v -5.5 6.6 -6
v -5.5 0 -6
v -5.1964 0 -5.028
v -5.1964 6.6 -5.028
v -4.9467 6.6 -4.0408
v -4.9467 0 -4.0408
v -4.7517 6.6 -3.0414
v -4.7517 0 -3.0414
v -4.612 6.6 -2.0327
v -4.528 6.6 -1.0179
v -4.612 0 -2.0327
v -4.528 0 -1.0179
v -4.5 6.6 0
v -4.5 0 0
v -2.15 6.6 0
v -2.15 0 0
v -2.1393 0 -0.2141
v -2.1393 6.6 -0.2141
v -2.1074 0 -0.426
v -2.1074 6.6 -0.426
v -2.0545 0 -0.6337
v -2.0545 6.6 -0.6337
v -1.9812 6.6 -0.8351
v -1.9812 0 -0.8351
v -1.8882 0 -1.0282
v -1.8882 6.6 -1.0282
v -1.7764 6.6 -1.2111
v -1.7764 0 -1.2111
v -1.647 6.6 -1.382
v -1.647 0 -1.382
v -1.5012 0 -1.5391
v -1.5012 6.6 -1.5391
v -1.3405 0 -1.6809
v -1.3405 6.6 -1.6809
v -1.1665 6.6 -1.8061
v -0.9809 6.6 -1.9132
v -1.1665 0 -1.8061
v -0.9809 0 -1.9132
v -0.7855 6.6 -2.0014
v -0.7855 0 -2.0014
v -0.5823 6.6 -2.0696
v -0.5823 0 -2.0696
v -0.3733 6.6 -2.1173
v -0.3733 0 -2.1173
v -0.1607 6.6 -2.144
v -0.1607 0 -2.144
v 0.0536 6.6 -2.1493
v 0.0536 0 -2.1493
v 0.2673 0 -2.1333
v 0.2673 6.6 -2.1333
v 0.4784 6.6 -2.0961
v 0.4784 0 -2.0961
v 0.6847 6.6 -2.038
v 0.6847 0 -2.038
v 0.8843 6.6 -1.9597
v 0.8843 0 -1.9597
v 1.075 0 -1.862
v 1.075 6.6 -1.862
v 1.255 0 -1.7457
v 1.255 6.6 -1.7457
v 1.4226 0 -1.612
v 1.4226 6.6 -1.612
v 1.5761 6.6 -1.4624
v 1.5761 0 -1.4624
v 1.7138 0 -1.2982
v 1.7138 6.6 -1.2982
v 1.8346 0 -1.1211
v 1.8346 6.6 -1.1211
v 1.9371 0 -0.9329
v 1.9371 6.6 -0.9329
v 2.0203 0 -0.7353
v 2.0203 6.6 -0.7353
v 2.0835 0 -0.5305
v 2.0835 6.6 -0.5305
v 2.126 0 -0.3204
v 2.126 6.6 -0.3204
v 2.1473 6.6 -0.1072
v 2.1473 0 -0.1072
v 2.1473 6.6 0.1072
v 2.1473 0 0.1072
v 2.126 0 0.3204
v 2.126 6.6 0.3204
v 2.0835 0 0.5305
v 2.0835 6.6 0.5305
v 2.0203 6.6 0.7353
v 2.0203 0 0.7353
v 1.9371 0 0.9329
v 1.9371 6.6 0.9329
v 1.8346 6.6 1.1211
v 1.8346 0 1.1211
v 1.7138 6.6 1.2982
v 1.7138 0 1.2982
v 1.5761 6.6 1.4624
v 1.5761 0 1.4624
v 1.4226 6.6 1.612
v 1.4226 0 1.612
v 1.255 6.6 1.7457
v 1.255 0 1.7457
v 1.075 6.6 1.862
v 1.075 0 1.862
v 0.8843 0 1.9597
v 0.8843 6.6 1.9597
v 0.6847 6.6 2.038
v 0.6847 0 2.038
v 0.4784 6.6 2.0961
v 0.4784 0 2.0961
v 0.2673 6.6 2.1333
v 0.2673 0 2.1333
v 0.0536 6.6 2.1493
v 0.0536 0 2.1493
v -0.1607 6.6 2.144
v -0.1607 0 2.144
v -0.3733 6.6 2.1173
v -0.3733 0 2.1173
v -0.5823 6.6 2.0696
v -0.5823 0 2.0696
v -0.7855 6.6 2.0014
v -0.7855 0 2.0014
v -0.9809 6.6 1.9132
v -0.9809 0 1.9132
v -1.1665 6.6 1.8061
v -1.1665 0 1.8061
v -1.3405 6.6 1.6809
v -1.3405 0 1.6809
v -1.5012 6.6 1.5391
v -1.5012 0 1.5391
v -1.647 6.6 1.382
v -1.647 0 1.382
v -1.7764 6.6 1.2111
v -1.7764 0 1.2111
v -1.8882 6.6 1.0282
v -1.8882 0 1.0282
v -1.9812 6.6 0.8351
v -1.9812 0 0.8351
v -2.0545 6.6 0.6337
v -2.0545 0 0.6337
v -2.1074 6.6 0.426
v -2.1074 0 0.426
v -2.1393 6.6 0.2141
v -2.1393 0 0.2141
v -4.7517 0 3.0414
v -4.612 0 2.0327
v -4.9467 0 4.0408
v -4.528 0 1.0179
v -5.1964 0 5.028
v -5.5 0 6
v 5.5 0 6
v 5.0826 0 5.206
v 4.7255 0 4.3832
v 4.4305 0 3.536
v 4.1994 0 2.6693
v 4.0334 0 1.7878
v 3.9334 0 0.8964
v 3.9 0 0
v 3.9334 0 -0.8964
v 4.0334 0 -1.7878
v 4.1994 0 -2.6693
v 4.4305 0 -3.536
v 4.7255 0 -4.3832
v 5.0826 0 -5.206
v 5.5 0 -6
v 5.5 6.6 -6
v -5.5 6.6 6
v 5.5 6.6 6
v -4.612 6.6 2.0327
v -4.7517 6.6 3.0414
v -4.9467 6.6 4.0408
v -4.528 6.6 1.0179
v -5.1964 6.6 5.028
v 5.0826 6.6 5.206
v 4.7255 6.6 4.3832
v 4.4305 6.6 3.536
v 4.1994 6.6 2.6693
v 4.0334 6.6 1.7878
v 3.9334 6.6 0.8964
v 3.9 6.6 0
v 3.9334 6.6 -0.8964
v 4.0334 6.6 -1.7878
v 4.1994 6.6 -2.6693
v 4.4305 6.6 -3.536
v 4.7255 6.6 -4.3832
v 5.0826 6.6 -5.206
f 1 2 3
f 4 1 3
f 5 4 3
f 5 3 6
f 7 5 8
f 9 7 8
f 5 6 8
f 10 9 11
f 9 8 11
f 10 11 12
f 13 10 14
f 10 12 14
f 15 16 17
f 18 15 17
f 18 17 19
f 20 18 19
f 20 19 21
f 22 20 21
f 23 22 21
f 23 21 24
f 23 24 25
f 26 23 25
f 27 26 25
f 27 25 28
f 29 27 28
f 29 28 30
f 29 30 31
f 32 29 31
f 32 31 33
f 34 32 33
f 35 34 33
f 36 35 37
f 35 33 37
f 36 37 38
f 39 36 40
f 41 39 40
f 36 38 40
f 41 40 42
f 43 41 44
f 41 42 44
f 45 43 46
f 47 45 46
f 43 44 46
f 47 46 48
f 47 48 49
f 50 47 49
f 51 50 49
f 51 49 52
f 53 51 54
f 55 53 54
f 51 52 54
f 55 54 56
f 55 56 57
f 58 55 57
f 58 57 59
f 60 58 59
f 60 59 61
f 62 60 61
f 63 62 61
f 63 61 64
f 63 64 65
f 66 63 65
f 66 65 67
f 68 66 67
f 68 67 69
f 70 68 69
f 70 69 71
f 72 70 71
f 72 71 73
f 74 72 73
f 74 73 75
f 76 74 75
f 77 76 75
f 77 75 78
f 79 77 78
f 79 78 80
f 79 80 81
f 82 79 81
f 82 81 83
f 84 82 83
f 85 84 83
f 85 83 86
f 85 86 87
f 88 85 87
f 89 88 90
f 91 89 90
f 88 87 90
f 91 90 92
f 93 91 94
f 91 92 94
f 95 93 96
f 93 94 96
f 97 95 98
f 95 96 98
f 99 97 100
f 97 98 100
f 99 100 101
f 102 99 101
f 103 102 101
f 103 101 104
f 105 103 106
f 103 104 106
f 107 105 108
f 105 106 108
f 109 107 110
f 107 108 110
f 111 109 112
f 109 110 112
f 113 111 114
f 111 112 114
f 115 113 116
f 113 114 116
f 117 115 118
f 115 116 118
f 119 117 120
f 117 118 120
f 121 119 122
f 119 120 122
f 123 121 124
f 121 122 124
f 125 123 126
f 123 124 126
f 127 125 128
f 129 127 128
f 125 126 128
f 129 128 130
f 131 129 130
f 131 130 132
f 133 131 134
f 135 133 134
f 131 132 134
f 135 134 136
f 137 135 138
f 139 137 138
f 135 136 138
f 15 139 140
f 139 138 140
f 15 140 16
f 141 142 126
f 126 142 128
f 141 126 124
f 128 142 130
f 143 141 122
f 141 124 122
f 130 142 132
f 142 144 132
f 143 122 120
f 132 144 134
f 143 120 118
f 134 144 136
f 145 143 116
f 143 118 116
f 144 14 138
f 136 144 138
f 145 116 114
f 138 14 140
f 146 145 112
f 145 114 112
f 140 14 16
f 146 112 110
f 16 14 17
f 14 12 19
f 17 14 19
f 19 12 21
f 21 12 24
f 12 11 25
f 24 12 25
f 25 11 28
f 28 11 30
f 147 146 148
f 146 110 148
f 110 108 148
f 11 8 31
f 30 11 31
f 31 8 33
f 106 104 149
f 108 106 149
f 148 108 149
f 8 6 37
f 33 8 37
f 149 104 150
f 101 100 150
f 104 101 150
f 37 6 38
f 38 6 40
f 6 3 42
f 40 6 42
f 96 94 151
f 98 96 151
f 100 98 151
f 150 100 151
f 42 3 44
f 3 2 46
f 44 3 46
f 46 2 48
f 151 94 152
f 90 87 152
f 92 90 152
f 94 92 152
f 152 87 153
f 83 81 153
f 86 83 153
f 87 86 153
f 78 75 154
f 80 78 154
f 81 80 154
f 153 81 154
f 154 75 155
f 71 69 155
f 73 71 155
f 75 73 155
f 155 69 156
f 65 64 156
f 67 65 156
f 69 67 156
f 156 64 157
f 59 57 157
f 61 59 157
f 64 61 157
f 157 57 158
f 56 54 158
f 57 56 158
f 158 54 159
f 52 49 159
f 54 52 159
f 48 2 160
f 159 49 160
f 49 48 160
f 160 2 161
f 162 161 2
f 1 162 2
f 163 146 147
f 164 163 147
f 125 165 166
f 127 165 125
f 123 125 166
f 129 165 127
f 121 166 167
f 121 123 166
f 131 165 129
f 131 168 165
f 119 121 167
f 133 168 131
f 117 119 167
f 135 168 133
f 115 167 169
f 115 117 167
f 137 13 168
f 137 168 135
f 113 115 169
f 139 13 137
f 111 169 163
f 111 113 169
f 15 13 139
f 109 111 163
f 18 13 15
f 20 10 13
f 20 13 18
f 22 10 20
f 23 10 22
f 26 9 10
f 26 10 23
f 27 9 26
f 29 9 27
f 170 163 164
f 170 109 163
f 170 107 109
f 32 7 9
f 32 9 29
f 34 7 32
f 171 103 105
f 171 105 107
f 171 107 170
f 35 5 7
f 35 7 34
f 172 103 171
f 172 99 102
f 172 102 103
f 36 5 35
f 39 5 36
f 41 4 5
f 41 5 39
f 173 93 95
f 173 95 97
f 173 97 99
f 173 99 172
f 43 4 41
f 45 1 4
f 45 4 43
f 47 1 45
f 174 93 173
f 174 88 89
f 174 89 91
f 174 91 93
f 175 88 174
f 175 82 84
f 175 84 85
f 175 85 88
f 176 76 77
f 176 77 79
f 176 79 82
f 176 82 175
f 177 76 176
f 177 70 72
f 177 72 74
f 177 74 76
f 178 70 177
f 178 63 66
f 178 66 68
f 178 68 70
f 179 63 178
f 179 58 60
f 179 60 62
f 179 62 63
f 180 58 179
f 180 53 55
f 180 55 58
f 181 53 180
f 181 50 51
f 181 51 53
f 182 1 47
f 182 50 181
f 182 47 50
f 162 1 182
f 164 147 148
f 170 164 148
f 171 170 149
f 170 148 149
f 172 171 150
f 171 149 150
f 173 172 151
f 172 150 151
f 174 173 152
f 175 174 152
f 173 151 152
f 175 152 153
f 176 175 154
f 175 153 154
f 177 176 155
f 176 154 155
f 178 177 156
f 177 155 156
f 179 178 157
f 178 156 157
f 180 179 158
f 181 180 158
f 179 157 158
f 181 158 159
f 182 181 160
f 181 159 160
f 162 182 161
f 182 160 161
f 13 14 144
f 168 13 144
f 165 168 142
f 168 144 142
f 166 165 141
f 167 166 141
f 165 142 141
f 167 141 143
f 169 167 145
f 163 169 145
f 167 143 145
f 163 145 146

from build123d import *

# Parameters (mm, degrees)
BOSS_EXTRUDE2_DEPTH  = 6.6
M4_CLEARANCE_HOLE2_D = 4.3


with BuildPart() as part:
    # Sketch1 → Boss-Extrude2 (new body)
    with BuildSketch(Plane(origin=(0, 0, 0), x_dir=(1, 0, 0), z_dir=(0, 1, 0))):
        with BuildLine():
            Line((5.5, 6), (-5.5, 6))
            ThreePointArc((-5.5, 6), (-4.751712409, 3.041381265), (-4.5, 0))
            ThreePointArc((-4.5, 0), (-4.751712409, -3.041381265), (-5.5, -6))
            Line((-5.5, -6), (5.5, -6))
            ThreePointArc((5.5, -6), (3.9, 0), (5.5, 6))
        make_face()
    extrude(amount=BOSS_EXTRUDE2_DEPTH)

    # M4 Clearance Hole2 (through all)
    with Locations(Plane(origin=(0, 6.6, 0), x_dir=(1, 0, 0), z_dir=(0, 1, 0))):
        with Locations((0, 0)):
            Hole(M4_CLEARANCE_HOLE2_D / 2)


solid = part.part
